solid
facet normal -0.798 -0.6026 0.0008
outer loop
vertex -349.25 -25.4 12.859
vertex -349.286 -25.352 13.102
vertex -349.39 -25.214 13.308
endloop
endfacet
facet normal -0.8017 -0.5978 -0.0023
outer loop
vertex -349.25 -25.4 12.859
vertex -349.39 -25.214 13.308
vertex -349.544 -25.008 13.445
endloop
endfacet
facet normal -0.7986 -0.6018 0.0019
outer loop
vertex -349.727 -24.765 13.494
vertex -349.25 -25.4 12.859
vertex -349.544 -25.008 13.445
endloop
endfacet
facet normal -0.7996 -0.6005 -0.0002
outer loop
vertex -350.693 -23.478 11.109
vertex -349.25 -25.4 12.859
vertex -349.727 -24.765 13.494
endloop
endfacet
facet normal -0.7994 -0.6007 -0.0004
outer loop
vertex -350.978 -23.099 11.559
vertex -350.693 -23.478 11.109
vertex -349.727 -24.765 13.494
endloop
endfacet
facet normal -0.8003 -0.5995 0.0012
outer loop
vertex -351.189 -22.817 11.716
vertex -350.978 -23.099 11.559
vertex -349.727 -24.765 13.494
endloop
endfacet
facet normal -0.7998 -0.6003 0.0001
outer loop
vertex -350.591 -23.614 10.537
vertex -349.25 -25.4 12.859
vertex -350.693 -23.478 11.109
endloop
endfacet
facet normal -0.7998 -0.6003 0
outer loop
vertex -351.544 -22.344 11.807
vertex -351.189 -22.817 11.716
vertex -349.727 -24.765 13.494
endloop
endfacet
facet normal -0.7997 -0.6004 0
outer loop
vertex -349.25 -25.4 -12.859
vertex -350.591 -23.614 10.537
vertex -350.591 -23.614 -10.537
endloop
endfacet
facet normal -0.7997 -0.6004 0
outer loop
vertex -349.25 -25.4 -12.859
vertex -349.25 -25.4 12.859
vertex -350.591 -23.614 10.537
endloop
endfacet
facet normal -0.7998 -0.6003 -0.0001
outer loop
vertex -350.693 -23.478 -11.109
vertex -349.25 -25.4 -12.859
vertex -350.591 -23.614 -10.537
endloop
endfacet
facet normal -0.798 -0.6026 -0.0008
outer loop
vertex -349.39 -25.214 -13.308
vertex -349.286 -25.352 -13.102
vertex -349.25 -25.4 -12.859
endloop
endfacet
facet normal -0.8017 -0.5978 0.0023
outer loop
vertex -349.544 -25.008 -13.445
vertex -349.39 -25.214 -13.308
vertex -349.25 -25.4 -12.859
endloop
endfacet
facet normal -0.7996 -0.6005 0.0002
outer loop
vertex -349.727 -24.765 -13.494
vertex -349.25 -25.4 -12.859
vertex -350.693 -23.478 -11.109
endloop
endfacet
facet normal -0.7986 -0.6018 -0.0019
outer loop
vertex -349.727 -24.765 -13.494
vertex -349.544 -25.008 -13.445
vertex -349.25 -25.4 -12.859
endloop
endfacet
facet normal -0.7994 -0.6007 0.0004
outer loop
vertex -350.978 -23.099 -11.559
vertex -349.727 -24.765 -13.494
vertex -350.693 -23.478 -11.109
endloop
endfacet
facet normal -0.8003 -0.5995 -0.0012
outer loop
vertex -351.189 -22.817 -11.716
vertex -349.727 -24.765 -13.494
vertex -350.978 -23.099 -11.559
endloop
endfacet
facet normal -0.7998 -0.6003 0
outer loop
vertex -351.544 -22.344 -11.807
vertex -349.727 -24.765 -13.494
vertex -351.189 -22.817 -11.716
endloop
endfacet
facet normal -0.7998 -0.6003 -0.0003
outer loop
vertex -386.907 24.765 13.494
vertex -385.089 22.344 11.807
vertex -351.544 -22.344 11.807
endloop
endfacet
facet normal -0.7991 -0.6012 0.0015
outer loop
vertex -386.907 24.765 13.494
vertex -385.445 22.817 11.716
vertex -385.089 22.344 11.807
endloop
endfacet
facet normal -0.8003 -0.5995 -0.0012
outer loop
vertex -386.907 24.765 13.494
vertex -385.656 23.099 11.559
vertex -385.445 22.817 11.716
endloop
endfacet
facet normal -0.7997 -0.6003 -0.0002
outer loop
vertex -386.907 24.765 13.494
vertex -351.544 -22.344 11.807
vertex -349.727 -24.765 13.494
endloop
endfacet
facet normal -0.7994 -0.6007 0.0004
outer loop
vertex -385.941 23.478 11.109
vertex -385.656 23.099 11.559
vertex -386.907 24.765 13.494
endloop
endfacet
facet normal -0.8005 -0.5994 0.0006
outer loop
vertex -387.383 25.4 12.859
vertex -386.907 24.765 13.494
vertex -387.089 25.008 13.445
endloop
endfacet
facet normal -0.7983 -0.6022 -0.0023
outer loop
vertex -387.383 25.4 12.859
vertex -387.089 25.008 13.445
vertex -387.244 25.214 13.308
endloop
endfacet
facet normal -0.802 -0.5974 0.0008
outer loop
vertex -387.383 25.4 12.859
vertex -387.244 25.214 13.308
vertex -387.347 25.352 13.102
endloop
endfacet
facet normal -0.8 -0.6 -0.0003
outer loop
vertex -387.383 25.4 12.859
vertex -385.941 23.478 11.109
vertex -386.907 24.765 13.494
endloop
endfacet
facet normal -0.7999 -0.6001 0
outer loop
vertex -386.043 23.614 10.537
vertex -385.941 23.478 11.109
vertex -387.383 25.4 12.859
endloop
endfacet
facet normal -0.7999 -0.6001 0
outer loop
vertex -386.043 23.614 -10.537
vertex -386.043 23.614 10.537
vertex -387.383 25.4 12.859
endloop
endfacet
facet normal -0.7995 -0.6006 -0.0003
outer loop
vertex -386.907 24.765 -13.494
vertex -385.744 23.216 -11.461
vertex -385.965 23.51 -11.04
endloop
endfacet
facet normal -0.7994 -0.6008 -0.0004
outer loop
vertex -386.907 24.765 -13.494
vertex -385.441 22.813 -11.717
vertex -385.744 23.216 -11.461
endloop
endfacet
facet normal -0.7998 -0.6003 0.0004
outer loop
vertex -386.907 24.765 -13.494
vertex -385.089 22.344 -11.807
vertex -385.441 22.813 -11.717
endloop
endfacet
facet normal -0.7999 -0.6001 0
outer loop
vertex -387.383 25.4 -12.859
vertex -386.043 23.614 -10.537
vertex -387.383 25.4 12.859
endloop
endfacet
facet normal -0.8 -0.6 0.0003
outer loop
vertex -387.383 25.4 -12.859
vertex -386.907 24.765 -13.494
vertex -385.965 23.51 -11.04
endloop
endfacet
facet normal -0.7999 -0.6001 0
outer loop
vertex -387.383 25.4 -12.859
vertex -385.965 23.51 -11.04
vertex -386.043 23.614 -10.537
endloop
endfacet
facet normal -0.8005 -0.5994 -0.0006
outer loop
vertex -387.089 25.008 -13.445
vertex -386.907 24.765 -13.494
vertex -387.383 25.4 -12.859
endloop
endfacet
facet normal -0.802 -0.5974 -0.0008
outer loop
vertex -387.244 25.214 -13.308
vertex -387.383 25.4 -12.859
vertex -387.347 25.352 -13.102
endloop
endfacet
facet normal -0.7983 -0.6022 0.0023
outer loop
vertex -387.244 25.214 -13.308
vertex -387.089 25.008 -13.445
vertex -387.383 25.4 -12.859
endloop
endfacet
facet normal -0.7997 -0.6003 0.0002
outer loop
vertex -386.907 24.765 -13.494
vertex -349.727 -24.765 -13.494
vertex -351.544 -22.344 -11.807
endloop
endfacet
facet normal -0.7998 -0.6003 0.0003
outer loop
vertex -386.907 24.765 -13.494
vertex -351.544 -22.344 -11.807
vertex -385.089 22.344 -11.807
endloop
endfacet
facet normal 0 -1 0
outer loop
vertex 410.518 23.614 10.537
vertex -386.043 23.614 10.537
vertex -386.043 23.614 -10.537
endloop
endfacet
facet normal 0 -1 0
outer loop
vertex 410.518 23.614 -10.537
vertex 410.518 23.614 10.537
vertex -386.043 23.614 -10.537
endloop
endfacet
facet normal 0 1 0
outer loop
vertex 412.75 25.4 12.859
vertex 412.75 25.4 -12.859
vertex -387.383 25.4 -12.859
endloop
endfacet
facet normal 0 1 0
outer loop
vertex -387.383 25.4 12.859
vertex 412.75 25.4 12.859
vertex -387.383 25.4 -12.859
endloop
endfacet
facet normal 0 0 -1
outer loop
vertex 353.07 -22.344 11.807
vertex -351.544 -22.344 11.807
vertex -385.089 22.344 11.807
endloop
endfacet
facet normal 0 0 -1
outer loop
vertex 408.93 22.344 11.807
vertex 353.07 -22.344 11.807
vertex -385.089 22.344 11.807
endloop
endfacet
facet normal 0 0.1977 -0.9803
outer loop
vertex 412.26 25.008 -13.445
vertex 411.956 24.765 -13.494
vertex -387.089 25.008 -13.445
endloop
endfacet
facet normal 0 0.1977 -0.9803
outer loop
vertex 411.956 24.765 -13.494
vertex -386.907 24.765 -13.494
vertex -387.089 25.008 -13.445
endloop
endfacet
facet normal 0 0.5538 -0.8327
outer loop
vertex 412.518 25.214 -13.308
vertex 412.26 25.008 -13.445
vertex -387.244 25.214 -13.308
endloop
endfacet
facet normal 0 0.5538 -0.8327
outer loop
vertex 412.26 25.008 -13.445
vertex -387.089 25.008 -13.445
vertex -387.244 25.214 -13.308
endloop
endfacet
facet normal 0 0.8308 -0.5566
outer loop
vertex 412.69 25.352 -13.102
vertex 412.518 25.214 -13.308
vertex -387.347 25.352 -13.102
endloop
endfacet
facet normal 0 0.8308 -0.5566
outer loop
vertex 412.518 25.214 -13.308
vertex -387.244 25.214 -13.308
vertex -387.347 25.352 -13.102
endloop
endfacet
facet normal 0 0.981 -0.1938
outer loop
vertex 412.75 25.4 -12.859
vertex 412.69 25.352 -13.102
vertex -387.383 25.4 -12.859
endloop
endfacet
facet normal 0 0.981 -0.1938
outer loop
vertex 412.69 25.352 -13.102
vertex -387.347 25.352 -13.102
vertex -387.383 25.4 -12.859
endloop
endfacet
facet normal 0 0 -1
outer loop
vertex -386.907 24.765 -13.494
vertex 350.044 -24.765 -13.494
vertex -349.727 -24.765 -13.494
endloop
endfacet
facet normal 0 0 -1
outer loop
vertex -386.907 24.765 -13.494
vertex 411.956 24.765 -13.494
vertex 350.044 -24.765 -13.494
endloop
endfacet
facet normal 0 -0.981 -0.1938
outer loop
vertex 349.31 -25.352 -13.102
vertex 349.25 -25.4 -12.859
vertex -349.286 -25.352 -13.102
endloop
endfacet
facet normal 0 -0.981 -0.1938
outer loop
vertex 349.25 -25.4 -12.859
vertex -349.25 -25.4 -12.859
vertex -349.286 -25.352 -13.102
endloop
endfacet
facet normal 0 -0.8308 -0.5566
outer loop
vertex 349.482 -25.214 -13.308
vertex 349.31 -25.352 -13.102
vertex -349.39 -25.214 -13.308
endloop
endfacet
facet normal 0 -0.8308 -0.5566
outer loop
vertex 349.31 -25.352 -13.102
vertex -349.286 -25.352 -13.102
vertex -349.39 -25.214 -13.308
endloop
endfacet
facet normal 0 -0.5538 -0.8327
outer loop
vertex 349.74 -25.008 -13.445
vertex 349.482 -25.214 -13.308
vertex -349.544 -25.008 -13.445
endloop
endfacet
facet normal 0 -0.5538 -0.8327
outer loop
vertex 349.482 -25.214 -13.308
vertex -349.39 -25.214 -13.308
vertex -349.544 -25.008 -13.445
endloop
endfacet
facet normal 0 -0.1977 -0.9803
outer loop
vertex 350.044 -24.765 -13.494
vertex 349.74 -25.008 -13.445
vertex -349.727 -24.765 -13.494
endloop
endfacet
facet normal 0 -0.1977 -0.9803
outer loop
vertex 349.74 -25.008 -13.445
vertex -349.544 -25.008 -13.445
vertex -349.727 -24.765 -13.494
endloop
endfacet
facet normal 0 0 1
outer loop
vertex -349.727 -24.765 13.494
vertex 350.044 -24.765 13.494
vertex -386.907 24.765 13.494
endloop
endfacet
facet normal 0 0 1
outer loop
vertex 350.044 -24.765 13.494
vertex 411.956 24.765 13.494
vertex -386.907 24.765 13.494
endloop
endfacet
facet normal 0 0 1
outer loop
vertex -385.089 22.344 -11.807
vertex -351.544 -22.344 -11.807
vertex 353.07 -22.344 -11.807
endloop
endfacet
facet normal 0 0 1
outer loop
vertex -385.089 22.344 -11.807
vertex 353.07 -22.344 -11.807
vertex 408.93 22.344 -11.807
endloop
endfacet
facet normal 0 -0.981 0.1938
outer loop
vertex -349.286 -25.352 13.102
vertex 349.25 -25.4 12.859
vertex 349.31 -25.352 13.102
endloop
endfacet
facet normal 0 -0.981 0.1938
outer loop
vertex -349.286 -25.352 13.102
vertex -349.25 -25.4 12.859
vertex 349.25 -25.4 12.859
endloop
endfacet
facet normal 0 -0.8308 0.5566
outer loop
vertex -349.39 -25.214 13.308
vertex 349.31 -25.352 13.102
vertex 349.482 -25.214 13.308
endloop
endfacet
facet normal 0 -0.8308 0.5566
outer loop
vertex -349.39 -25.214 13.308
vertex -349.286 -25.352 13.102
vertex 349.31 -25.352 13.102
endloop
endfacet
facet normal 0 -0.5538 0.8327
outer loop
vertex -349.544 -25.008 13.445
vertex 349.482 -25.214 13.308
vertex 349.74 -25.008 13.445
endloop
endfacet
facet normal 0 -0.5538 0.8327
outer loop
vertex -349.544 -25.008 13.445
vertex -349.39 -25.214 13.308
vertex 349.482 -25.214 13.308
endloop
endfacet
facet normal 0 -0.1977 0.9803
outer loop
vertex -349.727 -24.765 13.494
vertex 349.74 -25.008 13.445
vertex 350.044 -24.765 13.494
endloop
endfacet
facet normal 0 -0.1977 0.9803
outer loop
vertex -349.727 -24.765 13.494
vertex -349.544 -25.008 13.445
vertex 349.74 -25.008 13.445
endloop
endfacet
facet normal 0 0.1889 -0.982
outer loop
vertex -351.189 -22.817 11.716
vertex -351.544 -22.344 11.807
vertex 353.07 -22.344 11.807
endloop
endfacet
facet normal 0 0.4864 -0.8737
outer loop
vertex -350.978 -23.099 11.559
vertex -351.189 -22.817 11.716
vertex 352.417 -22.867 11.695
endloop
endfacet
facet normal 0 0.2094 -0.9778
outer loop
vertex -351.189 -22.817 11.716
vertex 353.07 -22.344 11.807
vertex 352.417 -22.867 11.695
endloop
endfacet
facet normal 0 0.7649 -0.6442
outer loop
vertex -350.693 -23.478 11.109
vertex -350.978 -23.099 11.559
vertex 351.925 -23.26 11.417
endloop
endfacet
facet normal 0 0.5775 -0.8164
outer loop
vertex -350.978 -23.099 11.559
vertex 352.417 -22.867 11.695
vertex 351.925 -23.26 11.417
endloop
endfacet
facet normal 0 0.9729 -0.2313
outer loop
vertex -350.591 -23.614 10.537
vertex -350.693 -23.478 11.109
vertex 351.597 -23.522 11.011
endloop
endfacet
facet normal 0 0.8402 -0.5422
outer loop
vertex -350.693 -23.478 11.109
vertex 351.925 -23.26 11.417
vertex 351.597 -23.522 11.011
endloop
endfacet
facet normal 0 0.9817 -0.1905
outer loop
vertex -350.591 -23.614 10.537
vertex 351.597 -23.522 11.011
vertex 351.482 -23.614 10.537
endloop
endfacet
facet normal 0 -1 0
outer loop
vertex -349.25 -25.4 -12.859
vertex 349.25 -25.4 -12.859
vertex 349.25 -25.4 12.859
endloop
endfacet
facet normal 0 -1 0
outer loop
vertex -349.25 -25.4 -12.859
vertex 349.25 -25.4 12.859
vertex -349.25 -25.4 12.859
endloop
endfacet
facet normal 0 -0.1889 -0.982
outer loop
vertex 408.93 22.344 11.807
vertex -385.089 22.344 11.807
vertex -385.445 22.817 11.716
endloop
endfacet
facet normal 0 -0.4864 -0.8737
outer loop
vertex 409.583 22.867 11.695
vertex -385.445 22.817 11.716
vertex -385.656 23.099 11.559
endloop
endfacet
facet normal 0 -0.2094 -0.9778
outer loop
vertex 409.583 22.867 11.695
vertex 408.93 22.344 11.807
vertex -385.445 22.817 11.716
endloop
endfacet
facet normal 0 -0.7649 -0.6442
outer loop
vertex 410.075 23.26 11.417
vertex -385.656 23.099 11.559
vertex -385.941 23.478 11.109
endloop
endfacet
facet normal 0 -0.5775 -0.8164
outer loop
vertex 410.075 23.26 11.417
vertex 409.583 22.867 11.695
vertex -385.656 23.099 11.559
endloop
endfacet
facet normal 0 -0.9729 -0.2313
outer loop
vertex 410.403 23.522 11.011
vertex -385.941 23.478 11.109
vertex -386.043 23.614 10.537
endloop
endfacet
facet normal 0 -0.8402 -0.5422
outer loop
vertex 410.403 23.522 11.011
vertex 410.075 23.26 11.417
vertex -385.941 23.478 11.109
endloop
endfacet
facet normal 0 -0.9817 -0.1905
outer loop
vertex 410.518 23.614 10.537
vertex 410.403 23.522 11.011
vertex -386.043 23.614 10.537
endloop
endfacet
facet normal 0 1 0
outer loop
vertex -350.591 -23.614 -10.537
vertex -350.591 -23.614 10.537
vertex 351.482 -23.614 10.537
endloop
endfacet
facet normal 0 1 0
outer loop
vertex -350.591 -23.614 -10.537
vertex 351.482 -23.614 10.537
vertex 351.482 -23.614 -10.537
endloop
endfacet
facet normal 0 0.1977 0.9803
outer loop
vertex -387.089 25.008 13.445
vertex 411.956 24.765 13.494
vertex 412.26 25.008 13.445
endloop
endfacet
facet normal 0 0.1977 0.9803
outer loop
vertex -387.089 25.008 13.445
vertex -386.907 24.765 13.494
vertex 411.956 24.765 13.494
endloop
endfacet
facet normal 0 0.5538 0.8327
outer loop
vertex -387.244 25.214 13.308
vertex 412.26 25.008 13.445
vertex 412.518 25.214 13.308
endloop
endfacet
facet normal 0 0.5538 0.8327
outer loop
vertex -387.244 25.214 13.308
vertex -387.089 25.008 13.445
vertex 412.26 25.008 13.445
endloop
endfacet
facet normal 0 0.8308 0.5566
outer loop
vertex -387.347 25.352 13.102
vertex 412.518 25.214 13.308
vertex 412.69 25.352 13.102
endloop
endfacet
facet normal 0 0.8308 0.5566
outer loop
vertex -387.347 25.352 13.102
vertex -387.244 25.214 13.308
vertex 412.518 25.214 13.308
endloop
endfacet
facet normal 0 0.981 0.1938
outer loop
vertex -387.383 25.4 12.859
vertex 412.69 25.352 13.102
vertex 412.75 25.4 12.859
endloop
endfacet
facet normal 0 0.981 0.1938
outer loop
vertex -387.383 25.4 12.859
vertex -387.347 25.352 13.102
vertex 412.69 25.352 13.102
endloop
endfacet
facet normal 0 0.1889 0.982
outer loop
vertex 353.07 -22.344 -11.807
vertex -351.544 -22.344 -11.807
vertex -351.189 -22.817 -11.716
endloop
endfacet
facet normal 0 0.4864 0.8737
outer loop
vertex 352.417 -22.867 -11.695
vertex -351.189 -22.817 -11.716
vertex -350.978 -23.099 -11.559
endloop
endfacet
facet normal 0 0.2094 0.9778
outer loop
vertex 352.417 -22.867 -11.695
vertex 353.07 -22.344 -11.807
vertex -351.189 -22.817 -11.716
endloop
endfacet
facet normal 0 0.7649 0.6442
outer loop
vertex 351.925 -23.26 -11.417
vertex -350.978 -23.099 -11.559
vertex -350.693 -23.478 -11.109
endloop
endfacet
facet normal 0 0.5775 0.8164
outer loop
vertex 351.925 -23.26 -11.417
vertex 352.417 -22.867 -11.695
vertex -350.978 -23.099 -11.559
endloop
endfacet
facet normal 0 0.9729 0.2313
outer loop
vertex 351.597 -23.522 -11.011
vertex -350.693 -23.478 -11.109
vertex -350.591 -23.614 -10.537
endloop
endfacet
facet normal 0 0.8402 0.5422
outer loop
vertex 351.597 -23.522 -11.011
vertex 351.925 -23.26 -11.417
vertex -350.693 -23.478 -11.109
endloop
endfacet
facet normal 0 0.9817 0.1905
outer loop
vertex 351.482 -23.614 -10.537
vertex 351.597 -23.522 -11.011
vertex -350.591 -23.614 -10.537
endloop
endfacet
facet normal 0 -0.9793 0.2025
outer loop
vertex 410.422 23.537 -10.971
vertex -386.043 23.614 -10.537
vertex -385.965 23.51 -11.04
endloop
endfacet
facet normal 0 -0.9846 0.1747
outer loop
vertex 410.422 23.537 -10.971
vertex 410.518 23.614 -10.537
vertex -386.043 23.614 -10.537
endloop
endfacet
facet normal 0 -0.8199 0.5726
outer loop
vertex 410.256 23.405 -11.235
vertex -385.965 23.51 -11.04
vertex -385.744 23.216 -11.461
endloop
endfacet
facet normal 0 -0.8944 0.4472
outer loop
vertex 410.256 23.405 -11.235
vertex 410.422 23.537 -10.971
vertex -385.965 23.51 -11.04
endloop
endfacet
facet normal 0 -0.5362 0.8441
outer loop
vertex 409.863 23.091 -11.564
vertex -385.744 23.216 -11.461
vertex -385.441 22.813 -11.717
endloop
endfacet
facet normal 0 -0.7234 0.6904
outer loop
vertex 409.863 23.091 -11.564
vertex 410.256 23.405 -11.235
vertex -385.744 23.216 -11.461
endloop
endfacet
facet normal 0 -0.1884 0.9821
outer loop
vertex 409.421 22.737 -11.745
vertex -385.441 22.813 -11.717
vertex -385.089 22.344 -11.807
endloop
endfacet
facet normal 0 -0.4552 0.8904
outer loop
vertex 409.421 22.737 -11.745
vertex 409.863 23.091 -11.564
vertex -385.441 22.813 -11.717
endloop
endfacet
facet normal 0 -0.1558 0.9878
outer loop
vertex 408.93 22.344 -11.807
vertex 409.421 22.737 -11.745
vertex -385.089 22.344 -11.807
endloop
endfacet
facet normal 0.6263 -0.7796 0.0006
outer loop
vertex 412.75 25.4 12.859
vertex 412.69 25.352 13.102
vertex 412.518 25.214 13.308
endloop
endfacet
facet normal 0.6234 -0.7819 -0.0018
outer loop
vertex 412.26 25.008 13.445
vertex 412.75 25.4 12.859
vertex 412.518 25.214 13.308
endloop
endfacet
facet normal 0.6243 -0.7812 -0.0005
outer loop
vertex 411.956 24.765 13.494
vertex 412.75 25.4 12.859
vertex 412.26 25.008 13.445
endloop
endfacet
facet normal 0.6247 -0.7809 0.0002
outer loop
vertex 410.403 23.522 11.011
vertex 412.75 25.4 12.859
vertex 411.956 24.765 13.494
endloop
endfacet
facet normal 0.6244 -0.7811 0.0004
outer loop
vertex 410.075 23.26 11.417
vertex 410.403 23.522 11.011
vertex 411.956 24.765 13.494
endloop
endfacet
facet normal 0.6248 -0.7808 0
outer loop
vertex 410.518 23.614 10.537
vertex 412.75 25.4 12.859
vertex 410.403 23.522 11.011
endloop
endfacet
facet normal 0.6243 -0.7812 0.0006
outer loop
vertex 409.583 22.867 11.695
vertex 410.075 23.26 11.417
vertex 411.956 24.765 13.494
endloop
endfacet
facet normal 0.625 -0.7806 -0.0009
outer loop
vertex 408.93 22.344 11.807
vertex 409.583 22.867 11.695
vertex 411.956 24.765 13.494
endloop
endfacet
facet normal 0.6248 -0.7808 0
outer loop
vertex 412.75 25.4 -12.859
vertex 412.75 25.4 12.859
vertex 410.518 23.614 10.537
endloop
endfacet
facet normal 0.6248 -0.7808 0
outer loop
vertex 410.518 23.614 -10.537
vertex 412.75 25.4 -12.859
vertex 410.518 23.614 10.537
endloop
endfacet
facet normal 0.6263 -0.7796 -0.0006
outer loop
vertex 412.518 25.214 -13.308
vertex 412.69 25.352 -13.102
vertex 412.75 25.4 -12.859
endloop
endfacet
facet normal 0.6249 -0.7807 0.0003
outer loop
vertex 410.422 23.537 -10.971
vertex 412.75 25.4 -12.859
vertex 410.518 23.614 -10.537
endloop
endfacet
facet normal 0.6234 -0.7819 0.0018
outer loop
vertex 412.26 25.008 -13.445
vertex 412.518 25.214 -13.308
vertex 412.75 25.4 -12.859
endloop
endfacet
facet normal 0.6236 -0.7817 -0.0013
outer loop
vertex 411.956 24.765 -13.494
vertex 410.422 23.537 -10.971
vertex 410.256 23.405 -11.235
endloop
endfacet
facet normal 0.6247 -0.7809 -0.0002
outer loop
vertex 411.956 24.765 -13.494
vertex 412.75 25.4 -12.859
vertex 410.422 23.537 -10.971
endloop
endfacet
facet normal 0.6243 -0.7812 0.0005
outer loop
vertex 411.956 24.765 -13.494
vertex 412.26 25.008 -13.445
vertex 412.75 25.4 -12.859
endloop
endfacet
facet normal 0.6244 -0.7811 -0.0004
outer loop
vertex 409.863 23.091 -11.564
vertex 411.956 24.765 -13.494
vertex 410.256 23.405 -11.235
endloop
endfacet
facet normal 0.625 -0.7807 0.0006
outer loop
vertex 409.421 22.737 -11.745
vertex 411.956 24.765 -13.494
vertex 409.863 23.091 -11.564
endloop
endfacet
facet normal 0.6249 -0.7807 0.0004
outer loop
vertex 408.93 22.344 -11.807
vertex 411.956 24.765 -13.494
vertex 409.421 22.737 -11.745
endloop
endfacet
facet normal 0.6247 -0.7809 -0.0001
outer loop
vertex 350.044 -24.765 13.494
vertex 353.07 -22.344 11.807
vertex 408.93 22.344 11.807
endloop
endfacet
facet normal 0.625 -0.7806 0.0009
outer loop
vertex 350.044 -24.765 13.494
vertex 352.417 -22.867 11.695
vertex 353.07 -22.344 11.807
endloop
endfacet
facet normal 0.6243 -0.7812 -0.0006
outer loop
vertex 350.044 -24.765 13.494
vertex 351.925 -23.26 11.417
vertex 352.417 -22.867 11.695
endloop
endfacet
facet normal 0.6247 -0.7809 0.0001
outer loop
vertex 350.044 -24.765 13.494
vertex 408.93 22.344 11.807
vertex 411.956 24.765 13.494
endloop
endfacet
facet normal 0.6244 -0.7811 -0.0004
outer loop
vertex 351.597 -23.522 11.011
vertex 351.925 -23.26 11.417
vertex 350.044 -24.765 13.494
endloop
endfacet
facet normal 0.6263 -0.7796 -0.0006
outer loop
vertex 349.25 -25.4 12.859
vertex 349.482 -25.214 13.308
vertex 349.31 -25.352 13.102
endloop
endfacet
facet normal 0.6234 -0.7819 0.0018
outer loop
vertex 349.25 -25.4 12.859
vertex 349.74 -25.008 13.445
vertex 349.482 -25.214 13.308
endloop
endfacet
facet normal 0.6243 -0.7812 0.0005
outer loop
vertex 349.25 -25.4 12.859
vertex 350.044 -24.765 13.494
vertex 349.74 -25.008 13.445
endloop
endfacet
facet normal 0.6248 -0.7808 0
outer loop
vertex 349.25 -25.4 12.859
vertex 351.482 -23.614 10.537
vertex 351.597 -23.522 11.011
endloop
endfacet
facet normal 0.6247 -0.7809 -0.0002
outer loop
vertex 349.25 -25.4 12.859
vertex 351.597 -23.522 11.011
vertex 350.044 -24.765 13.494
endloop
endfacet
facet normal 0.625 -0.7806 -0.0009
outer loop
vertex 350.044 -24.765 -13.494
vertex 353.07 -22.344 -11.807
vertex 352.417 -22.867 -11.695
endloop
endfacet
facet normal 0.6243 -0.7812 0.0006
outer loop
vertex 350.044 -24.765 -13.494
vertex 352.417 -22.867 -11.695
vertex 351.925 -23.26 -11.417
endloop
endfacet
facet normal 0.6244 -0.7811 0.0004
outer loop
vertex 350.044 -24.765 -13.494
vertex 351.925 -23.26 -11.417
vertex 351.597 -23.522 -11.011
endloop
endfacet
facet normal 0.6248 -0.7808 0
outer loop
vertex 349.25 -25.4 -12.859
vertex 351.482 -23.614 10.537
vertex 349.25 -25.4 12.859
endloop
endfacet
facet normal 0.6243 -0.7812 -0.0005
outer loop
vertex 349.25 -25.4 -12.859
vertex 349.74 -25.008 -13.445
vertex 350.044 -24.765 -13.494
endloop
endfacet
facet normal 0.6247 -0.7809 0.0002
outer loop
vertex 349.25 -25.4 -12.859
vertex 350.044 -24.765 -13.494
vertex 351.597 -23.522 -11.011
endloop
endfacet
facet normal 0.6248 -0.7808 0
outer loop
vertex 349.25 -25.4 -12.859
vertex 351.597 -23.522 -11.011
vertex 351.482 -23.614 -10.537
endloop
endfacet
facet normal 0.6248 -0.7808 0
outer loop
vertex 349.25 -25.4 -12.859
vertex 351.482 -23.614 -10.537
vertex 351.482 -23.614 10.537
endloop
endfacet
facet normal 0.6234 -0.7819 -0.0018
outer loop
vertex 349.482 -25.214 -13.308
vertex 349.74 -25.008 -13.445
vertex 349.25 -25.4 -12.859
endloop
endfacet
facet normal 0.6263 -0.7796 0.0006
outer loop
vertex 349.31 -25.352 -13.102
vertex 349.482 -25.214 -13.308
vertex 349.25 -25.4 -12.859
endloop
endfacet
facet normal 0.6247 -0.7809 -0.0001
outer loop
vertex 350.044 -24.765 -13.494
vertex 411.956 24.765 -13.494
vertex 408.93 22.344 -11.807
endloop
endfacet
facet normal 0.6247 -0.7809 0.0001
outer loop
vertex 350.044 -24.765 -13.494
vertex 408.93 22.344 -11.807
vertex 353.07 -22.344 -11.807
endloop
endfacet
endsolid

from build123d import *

# Parameters (mm, degrees)
BOSS_EXTRUDE1_DEPTH      = 13.49375
BOSS_EXTRUDE1_DEPTH_BACK = 13.49375
CUT_EXTRUDE1_DEPTH       = 414.750895817
CUT_EXTRUDE1_DEPTH_BACK  = 414.750895817
SKETCH3_W                = 23.6140625
SKETCH3_H                = 47.228125
FILLET1_R                = 1.27
FILLET2_R                = 0.635


with BuildPart() as part:
    # Sketch2 → Boss-Extrude1 (new, two sides: drawn at the far end of the back side and taken through both)
    with BuildSketch(Plane.XY.offset(-BOSS_EXTRUDE1_DEPTH_BACK)):
        Polygon((-349.25, -25.4), (-387.383370876, 25.4), (-349.25, 25.4), (349.25, 25.4), (412.75, 25.4), (349.25, -25.4), align=None)
    extrude(amount=BOSS_EXTRUDE1_DEPTH + BOSS_EXTRUDE1_DEPTH_BACK)

    # Sketch3 → Cut-Extrude1 (cut, two sides: drawn at the far end of the back side and taken through both)
    with BuildSketch(Plane(origin=(0, 0, 0), x_dir=(0, 0, -1), z_dir=(1, 0, 0)).offset(-CUT_EXTRUDE1_DEPTH_BACK)):
        Rectangle(SKETCH3_W, SKETCH3_H)
    extrude(amount=CUT_EXTRUDE1_DEPTH + CUT_EXTRUDE1_DEPTH_BACK, mode=Mode.SUBTRACT)

    # Fillet1
    fillet1_edges = [part.edges().sort_by_distance(p)[0] for p in [
        (0.445897778, -23.6140625, -11.80703125),
        (0.445897778, -23.6140625, 11.80703125),
        (12.237416785, 23.6140625, 11.80703125),
        (12.237416785, 23.6140625, -11.80703125),
    ]]
    fillet(fillet1_edges, radius=FILLET1_R)

    # Fillet2
    fillet2_edges = [part.edges().sort_by_distance(p)[0] for p in [
        (12.683314562, 25.4, 13.49375),
        (0, -25.4, 13.49375),
        (0, -25.4, -13.49375),
        (12.683314562, 25.4, -13.49375),
    ]]
    fillet(fillet2_edges, radius=FILLET2_R)


solid = part.part
